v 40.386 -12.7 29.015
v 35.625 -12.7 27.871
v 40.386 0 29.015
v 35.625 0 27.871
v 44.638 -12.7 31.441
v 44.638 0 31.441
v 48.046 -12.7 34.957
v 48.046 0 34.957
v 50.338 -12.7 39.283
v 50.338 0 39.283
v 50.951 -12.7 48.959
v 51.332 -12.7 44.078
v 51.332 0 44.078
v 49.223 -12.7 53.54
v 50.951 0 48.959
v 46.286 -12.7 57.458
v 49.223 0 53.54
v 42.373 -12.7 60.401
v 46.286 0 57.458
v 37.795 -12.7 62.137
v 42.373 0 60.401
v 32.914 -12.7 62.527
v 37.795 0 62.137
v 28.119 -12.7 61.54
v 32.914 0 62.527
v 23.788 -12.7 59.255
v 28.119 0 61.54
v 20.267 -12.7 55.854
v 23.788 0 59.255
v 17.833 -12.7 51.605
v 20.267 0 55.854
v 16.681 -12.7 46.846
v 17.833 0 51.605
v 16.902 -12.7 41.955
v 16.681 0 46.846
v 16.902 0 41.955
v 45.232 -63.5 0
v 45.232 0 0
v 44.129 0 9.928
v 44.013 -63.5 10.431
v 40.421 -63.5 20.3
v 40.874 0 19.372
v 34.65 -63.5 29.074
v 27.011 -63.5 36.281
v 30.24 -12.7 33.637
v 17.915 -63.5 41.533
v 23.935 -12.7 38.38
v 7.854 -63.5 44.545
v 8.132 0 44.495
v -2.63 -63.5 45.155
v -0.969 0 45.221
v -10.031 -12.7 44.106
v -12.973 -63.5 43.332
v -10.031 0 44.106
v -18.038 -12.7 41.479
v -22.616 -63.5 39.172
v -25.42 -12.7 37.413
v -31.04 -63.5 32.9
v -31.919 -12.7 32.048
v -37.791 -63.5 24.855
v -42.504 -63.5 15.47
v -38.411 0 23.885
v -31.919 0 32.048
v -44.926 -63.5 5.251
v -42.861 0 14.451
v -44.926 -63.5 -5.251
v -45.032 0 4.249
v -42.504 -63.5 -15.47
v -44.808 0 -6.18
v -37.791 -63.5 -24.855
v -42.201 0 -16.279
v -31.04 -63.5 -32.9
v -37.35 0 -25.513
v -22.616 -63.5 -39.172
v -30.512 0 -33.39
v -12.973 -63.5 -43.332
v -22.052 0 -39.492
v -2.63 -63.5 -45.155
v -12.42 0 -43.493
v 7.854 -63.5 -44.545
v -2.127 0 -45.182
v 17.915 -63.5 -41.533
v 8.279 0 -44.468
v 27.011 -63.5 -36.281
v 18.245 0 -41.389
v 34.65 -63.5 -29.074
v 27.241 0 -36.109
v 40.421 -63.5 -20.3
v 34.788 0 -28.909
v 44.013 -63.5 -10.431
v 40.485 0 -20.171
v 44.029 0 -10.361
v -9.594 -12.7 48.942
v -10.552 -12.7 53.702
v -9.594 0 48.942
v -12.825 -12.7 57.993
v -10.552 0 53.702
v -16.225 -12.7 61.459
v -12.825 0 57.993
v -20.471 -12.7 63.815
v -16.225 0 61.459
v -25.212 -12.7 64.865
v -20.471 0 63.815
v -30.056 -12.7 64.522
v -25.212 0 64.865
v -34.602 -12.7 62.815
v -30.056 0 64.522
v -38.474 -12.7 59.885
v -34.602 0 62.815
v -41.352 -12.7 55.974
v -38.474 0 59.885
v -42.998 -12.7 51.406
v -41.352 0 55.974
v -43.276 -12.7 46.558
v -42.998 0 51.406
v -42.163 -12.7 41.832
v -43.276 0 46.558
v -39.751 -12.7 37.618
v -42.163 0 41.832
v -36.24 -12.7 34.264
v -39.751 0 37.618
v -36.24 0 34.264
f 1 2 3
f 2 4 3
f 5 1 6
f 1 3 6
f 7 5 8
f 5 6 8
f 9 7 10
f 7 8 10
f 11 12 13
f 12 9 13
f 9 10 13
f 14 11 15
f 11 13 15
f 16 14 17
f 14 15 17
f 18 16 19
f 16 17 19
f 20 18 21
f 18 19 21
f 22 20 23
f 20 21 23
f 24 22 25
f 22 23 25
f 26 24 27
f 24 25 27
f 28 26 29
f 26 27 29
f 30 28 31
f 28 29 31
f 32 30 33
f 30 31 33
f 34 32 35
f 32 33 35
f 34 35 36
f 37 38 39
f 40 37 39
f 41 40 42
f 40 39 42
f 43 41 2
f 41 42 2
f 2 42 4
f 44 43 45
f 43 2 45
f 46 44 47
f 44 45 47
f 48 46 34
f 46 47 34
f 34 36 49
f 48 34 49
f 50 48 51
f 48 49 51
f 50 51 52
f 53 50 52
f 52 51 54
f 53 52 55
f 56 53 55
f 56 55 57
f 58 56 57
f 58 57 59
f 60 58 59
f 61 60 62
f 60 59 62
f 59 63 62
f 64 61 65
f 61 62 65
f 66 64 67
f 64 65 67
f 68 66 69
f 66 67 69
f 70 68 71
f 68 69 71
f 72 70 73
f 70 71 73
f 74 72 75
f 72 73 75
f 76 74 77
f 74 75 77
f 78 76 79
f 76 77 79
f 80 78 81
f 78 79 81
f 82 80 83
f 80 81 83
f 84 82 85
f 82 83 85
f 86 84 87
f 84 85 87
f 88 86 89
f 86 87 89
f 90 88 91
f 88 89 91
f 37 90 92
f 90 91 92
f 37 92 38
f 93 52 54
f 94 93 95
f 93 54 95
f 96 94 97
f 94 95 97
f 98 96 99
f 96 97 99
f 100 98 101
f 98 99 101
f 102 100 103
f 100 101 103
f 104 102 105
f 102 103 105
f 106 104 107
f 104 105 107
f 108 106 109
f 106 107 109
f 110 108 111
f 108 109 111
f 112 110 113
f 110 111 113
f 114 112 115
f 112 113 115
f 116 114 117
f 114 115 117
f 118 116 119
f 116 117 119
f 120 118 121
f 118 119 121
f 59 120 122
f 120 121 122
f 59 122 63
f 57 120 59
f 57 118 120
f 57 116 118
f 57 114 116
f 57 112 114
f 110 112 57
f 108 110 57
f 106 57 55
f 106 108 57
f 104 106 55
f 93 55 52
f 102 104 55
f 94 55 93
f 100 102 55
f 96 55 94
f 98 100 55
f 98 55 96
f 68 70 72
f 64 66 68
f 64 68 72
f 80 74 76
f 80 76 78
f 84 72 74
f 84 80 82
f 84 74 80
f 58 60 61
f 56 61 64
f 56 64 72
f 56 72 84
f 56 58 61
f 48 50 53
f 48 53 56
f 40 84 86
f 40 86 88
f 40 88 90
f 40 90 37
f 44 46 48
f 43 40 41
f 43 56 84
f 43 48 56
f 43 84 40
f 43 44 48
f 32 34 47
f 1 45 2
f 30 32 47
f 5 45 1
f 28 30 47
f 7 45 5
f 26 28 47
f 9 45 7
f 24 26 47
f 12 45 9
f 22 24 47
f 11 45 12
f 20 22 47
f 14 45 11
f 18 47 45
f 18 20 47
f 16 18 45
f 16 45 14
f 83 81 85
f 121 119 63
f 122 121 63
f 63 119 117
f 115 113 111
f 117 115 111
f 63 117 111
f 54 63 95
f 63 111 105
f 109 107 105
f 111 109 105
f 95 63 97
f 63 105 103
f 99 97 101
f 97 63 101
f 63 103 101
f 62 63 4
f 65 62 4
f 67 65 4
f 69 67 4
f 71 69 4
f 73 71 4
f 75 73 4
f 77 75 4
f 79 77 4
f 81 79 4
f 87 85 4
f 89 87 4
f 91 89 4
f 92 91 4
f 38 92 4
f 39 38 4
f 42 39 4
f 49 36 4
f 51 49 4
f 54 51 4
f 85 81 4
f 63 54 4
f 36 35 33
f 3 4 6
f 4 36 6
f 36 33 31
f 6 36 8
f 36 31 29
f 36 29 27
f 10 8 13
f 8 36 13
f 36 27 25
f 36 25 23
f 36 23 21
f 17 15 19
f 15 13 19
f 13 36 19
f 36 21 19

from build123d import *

# Parameters (mm, degrees)
F0_R     = 45.231736
F1_DEPTH = 63.5
F2_R     = 16.885337
F2_R_2   = 17.383209
F3_DEPTH = 12.7


with BuildPart() as f1:
    # F0 (on Front) → F1 (new body)
    with BuildSketch(Plane.XZ):
        Circle(F0_R)
    extrude(amount=F1_DEPTH)

    # F2 (on Front) → F3 (join)
    with BuildSketch(Plane.XZ):
        with Locations((-26.454598, 48.025273)):
            Circle(F2_R)
        with Locations((33.983976, 45.176312)):
            Circle(F2_R_2)
    extrude(amount=F3_DEPTH)


solid = f1.part
